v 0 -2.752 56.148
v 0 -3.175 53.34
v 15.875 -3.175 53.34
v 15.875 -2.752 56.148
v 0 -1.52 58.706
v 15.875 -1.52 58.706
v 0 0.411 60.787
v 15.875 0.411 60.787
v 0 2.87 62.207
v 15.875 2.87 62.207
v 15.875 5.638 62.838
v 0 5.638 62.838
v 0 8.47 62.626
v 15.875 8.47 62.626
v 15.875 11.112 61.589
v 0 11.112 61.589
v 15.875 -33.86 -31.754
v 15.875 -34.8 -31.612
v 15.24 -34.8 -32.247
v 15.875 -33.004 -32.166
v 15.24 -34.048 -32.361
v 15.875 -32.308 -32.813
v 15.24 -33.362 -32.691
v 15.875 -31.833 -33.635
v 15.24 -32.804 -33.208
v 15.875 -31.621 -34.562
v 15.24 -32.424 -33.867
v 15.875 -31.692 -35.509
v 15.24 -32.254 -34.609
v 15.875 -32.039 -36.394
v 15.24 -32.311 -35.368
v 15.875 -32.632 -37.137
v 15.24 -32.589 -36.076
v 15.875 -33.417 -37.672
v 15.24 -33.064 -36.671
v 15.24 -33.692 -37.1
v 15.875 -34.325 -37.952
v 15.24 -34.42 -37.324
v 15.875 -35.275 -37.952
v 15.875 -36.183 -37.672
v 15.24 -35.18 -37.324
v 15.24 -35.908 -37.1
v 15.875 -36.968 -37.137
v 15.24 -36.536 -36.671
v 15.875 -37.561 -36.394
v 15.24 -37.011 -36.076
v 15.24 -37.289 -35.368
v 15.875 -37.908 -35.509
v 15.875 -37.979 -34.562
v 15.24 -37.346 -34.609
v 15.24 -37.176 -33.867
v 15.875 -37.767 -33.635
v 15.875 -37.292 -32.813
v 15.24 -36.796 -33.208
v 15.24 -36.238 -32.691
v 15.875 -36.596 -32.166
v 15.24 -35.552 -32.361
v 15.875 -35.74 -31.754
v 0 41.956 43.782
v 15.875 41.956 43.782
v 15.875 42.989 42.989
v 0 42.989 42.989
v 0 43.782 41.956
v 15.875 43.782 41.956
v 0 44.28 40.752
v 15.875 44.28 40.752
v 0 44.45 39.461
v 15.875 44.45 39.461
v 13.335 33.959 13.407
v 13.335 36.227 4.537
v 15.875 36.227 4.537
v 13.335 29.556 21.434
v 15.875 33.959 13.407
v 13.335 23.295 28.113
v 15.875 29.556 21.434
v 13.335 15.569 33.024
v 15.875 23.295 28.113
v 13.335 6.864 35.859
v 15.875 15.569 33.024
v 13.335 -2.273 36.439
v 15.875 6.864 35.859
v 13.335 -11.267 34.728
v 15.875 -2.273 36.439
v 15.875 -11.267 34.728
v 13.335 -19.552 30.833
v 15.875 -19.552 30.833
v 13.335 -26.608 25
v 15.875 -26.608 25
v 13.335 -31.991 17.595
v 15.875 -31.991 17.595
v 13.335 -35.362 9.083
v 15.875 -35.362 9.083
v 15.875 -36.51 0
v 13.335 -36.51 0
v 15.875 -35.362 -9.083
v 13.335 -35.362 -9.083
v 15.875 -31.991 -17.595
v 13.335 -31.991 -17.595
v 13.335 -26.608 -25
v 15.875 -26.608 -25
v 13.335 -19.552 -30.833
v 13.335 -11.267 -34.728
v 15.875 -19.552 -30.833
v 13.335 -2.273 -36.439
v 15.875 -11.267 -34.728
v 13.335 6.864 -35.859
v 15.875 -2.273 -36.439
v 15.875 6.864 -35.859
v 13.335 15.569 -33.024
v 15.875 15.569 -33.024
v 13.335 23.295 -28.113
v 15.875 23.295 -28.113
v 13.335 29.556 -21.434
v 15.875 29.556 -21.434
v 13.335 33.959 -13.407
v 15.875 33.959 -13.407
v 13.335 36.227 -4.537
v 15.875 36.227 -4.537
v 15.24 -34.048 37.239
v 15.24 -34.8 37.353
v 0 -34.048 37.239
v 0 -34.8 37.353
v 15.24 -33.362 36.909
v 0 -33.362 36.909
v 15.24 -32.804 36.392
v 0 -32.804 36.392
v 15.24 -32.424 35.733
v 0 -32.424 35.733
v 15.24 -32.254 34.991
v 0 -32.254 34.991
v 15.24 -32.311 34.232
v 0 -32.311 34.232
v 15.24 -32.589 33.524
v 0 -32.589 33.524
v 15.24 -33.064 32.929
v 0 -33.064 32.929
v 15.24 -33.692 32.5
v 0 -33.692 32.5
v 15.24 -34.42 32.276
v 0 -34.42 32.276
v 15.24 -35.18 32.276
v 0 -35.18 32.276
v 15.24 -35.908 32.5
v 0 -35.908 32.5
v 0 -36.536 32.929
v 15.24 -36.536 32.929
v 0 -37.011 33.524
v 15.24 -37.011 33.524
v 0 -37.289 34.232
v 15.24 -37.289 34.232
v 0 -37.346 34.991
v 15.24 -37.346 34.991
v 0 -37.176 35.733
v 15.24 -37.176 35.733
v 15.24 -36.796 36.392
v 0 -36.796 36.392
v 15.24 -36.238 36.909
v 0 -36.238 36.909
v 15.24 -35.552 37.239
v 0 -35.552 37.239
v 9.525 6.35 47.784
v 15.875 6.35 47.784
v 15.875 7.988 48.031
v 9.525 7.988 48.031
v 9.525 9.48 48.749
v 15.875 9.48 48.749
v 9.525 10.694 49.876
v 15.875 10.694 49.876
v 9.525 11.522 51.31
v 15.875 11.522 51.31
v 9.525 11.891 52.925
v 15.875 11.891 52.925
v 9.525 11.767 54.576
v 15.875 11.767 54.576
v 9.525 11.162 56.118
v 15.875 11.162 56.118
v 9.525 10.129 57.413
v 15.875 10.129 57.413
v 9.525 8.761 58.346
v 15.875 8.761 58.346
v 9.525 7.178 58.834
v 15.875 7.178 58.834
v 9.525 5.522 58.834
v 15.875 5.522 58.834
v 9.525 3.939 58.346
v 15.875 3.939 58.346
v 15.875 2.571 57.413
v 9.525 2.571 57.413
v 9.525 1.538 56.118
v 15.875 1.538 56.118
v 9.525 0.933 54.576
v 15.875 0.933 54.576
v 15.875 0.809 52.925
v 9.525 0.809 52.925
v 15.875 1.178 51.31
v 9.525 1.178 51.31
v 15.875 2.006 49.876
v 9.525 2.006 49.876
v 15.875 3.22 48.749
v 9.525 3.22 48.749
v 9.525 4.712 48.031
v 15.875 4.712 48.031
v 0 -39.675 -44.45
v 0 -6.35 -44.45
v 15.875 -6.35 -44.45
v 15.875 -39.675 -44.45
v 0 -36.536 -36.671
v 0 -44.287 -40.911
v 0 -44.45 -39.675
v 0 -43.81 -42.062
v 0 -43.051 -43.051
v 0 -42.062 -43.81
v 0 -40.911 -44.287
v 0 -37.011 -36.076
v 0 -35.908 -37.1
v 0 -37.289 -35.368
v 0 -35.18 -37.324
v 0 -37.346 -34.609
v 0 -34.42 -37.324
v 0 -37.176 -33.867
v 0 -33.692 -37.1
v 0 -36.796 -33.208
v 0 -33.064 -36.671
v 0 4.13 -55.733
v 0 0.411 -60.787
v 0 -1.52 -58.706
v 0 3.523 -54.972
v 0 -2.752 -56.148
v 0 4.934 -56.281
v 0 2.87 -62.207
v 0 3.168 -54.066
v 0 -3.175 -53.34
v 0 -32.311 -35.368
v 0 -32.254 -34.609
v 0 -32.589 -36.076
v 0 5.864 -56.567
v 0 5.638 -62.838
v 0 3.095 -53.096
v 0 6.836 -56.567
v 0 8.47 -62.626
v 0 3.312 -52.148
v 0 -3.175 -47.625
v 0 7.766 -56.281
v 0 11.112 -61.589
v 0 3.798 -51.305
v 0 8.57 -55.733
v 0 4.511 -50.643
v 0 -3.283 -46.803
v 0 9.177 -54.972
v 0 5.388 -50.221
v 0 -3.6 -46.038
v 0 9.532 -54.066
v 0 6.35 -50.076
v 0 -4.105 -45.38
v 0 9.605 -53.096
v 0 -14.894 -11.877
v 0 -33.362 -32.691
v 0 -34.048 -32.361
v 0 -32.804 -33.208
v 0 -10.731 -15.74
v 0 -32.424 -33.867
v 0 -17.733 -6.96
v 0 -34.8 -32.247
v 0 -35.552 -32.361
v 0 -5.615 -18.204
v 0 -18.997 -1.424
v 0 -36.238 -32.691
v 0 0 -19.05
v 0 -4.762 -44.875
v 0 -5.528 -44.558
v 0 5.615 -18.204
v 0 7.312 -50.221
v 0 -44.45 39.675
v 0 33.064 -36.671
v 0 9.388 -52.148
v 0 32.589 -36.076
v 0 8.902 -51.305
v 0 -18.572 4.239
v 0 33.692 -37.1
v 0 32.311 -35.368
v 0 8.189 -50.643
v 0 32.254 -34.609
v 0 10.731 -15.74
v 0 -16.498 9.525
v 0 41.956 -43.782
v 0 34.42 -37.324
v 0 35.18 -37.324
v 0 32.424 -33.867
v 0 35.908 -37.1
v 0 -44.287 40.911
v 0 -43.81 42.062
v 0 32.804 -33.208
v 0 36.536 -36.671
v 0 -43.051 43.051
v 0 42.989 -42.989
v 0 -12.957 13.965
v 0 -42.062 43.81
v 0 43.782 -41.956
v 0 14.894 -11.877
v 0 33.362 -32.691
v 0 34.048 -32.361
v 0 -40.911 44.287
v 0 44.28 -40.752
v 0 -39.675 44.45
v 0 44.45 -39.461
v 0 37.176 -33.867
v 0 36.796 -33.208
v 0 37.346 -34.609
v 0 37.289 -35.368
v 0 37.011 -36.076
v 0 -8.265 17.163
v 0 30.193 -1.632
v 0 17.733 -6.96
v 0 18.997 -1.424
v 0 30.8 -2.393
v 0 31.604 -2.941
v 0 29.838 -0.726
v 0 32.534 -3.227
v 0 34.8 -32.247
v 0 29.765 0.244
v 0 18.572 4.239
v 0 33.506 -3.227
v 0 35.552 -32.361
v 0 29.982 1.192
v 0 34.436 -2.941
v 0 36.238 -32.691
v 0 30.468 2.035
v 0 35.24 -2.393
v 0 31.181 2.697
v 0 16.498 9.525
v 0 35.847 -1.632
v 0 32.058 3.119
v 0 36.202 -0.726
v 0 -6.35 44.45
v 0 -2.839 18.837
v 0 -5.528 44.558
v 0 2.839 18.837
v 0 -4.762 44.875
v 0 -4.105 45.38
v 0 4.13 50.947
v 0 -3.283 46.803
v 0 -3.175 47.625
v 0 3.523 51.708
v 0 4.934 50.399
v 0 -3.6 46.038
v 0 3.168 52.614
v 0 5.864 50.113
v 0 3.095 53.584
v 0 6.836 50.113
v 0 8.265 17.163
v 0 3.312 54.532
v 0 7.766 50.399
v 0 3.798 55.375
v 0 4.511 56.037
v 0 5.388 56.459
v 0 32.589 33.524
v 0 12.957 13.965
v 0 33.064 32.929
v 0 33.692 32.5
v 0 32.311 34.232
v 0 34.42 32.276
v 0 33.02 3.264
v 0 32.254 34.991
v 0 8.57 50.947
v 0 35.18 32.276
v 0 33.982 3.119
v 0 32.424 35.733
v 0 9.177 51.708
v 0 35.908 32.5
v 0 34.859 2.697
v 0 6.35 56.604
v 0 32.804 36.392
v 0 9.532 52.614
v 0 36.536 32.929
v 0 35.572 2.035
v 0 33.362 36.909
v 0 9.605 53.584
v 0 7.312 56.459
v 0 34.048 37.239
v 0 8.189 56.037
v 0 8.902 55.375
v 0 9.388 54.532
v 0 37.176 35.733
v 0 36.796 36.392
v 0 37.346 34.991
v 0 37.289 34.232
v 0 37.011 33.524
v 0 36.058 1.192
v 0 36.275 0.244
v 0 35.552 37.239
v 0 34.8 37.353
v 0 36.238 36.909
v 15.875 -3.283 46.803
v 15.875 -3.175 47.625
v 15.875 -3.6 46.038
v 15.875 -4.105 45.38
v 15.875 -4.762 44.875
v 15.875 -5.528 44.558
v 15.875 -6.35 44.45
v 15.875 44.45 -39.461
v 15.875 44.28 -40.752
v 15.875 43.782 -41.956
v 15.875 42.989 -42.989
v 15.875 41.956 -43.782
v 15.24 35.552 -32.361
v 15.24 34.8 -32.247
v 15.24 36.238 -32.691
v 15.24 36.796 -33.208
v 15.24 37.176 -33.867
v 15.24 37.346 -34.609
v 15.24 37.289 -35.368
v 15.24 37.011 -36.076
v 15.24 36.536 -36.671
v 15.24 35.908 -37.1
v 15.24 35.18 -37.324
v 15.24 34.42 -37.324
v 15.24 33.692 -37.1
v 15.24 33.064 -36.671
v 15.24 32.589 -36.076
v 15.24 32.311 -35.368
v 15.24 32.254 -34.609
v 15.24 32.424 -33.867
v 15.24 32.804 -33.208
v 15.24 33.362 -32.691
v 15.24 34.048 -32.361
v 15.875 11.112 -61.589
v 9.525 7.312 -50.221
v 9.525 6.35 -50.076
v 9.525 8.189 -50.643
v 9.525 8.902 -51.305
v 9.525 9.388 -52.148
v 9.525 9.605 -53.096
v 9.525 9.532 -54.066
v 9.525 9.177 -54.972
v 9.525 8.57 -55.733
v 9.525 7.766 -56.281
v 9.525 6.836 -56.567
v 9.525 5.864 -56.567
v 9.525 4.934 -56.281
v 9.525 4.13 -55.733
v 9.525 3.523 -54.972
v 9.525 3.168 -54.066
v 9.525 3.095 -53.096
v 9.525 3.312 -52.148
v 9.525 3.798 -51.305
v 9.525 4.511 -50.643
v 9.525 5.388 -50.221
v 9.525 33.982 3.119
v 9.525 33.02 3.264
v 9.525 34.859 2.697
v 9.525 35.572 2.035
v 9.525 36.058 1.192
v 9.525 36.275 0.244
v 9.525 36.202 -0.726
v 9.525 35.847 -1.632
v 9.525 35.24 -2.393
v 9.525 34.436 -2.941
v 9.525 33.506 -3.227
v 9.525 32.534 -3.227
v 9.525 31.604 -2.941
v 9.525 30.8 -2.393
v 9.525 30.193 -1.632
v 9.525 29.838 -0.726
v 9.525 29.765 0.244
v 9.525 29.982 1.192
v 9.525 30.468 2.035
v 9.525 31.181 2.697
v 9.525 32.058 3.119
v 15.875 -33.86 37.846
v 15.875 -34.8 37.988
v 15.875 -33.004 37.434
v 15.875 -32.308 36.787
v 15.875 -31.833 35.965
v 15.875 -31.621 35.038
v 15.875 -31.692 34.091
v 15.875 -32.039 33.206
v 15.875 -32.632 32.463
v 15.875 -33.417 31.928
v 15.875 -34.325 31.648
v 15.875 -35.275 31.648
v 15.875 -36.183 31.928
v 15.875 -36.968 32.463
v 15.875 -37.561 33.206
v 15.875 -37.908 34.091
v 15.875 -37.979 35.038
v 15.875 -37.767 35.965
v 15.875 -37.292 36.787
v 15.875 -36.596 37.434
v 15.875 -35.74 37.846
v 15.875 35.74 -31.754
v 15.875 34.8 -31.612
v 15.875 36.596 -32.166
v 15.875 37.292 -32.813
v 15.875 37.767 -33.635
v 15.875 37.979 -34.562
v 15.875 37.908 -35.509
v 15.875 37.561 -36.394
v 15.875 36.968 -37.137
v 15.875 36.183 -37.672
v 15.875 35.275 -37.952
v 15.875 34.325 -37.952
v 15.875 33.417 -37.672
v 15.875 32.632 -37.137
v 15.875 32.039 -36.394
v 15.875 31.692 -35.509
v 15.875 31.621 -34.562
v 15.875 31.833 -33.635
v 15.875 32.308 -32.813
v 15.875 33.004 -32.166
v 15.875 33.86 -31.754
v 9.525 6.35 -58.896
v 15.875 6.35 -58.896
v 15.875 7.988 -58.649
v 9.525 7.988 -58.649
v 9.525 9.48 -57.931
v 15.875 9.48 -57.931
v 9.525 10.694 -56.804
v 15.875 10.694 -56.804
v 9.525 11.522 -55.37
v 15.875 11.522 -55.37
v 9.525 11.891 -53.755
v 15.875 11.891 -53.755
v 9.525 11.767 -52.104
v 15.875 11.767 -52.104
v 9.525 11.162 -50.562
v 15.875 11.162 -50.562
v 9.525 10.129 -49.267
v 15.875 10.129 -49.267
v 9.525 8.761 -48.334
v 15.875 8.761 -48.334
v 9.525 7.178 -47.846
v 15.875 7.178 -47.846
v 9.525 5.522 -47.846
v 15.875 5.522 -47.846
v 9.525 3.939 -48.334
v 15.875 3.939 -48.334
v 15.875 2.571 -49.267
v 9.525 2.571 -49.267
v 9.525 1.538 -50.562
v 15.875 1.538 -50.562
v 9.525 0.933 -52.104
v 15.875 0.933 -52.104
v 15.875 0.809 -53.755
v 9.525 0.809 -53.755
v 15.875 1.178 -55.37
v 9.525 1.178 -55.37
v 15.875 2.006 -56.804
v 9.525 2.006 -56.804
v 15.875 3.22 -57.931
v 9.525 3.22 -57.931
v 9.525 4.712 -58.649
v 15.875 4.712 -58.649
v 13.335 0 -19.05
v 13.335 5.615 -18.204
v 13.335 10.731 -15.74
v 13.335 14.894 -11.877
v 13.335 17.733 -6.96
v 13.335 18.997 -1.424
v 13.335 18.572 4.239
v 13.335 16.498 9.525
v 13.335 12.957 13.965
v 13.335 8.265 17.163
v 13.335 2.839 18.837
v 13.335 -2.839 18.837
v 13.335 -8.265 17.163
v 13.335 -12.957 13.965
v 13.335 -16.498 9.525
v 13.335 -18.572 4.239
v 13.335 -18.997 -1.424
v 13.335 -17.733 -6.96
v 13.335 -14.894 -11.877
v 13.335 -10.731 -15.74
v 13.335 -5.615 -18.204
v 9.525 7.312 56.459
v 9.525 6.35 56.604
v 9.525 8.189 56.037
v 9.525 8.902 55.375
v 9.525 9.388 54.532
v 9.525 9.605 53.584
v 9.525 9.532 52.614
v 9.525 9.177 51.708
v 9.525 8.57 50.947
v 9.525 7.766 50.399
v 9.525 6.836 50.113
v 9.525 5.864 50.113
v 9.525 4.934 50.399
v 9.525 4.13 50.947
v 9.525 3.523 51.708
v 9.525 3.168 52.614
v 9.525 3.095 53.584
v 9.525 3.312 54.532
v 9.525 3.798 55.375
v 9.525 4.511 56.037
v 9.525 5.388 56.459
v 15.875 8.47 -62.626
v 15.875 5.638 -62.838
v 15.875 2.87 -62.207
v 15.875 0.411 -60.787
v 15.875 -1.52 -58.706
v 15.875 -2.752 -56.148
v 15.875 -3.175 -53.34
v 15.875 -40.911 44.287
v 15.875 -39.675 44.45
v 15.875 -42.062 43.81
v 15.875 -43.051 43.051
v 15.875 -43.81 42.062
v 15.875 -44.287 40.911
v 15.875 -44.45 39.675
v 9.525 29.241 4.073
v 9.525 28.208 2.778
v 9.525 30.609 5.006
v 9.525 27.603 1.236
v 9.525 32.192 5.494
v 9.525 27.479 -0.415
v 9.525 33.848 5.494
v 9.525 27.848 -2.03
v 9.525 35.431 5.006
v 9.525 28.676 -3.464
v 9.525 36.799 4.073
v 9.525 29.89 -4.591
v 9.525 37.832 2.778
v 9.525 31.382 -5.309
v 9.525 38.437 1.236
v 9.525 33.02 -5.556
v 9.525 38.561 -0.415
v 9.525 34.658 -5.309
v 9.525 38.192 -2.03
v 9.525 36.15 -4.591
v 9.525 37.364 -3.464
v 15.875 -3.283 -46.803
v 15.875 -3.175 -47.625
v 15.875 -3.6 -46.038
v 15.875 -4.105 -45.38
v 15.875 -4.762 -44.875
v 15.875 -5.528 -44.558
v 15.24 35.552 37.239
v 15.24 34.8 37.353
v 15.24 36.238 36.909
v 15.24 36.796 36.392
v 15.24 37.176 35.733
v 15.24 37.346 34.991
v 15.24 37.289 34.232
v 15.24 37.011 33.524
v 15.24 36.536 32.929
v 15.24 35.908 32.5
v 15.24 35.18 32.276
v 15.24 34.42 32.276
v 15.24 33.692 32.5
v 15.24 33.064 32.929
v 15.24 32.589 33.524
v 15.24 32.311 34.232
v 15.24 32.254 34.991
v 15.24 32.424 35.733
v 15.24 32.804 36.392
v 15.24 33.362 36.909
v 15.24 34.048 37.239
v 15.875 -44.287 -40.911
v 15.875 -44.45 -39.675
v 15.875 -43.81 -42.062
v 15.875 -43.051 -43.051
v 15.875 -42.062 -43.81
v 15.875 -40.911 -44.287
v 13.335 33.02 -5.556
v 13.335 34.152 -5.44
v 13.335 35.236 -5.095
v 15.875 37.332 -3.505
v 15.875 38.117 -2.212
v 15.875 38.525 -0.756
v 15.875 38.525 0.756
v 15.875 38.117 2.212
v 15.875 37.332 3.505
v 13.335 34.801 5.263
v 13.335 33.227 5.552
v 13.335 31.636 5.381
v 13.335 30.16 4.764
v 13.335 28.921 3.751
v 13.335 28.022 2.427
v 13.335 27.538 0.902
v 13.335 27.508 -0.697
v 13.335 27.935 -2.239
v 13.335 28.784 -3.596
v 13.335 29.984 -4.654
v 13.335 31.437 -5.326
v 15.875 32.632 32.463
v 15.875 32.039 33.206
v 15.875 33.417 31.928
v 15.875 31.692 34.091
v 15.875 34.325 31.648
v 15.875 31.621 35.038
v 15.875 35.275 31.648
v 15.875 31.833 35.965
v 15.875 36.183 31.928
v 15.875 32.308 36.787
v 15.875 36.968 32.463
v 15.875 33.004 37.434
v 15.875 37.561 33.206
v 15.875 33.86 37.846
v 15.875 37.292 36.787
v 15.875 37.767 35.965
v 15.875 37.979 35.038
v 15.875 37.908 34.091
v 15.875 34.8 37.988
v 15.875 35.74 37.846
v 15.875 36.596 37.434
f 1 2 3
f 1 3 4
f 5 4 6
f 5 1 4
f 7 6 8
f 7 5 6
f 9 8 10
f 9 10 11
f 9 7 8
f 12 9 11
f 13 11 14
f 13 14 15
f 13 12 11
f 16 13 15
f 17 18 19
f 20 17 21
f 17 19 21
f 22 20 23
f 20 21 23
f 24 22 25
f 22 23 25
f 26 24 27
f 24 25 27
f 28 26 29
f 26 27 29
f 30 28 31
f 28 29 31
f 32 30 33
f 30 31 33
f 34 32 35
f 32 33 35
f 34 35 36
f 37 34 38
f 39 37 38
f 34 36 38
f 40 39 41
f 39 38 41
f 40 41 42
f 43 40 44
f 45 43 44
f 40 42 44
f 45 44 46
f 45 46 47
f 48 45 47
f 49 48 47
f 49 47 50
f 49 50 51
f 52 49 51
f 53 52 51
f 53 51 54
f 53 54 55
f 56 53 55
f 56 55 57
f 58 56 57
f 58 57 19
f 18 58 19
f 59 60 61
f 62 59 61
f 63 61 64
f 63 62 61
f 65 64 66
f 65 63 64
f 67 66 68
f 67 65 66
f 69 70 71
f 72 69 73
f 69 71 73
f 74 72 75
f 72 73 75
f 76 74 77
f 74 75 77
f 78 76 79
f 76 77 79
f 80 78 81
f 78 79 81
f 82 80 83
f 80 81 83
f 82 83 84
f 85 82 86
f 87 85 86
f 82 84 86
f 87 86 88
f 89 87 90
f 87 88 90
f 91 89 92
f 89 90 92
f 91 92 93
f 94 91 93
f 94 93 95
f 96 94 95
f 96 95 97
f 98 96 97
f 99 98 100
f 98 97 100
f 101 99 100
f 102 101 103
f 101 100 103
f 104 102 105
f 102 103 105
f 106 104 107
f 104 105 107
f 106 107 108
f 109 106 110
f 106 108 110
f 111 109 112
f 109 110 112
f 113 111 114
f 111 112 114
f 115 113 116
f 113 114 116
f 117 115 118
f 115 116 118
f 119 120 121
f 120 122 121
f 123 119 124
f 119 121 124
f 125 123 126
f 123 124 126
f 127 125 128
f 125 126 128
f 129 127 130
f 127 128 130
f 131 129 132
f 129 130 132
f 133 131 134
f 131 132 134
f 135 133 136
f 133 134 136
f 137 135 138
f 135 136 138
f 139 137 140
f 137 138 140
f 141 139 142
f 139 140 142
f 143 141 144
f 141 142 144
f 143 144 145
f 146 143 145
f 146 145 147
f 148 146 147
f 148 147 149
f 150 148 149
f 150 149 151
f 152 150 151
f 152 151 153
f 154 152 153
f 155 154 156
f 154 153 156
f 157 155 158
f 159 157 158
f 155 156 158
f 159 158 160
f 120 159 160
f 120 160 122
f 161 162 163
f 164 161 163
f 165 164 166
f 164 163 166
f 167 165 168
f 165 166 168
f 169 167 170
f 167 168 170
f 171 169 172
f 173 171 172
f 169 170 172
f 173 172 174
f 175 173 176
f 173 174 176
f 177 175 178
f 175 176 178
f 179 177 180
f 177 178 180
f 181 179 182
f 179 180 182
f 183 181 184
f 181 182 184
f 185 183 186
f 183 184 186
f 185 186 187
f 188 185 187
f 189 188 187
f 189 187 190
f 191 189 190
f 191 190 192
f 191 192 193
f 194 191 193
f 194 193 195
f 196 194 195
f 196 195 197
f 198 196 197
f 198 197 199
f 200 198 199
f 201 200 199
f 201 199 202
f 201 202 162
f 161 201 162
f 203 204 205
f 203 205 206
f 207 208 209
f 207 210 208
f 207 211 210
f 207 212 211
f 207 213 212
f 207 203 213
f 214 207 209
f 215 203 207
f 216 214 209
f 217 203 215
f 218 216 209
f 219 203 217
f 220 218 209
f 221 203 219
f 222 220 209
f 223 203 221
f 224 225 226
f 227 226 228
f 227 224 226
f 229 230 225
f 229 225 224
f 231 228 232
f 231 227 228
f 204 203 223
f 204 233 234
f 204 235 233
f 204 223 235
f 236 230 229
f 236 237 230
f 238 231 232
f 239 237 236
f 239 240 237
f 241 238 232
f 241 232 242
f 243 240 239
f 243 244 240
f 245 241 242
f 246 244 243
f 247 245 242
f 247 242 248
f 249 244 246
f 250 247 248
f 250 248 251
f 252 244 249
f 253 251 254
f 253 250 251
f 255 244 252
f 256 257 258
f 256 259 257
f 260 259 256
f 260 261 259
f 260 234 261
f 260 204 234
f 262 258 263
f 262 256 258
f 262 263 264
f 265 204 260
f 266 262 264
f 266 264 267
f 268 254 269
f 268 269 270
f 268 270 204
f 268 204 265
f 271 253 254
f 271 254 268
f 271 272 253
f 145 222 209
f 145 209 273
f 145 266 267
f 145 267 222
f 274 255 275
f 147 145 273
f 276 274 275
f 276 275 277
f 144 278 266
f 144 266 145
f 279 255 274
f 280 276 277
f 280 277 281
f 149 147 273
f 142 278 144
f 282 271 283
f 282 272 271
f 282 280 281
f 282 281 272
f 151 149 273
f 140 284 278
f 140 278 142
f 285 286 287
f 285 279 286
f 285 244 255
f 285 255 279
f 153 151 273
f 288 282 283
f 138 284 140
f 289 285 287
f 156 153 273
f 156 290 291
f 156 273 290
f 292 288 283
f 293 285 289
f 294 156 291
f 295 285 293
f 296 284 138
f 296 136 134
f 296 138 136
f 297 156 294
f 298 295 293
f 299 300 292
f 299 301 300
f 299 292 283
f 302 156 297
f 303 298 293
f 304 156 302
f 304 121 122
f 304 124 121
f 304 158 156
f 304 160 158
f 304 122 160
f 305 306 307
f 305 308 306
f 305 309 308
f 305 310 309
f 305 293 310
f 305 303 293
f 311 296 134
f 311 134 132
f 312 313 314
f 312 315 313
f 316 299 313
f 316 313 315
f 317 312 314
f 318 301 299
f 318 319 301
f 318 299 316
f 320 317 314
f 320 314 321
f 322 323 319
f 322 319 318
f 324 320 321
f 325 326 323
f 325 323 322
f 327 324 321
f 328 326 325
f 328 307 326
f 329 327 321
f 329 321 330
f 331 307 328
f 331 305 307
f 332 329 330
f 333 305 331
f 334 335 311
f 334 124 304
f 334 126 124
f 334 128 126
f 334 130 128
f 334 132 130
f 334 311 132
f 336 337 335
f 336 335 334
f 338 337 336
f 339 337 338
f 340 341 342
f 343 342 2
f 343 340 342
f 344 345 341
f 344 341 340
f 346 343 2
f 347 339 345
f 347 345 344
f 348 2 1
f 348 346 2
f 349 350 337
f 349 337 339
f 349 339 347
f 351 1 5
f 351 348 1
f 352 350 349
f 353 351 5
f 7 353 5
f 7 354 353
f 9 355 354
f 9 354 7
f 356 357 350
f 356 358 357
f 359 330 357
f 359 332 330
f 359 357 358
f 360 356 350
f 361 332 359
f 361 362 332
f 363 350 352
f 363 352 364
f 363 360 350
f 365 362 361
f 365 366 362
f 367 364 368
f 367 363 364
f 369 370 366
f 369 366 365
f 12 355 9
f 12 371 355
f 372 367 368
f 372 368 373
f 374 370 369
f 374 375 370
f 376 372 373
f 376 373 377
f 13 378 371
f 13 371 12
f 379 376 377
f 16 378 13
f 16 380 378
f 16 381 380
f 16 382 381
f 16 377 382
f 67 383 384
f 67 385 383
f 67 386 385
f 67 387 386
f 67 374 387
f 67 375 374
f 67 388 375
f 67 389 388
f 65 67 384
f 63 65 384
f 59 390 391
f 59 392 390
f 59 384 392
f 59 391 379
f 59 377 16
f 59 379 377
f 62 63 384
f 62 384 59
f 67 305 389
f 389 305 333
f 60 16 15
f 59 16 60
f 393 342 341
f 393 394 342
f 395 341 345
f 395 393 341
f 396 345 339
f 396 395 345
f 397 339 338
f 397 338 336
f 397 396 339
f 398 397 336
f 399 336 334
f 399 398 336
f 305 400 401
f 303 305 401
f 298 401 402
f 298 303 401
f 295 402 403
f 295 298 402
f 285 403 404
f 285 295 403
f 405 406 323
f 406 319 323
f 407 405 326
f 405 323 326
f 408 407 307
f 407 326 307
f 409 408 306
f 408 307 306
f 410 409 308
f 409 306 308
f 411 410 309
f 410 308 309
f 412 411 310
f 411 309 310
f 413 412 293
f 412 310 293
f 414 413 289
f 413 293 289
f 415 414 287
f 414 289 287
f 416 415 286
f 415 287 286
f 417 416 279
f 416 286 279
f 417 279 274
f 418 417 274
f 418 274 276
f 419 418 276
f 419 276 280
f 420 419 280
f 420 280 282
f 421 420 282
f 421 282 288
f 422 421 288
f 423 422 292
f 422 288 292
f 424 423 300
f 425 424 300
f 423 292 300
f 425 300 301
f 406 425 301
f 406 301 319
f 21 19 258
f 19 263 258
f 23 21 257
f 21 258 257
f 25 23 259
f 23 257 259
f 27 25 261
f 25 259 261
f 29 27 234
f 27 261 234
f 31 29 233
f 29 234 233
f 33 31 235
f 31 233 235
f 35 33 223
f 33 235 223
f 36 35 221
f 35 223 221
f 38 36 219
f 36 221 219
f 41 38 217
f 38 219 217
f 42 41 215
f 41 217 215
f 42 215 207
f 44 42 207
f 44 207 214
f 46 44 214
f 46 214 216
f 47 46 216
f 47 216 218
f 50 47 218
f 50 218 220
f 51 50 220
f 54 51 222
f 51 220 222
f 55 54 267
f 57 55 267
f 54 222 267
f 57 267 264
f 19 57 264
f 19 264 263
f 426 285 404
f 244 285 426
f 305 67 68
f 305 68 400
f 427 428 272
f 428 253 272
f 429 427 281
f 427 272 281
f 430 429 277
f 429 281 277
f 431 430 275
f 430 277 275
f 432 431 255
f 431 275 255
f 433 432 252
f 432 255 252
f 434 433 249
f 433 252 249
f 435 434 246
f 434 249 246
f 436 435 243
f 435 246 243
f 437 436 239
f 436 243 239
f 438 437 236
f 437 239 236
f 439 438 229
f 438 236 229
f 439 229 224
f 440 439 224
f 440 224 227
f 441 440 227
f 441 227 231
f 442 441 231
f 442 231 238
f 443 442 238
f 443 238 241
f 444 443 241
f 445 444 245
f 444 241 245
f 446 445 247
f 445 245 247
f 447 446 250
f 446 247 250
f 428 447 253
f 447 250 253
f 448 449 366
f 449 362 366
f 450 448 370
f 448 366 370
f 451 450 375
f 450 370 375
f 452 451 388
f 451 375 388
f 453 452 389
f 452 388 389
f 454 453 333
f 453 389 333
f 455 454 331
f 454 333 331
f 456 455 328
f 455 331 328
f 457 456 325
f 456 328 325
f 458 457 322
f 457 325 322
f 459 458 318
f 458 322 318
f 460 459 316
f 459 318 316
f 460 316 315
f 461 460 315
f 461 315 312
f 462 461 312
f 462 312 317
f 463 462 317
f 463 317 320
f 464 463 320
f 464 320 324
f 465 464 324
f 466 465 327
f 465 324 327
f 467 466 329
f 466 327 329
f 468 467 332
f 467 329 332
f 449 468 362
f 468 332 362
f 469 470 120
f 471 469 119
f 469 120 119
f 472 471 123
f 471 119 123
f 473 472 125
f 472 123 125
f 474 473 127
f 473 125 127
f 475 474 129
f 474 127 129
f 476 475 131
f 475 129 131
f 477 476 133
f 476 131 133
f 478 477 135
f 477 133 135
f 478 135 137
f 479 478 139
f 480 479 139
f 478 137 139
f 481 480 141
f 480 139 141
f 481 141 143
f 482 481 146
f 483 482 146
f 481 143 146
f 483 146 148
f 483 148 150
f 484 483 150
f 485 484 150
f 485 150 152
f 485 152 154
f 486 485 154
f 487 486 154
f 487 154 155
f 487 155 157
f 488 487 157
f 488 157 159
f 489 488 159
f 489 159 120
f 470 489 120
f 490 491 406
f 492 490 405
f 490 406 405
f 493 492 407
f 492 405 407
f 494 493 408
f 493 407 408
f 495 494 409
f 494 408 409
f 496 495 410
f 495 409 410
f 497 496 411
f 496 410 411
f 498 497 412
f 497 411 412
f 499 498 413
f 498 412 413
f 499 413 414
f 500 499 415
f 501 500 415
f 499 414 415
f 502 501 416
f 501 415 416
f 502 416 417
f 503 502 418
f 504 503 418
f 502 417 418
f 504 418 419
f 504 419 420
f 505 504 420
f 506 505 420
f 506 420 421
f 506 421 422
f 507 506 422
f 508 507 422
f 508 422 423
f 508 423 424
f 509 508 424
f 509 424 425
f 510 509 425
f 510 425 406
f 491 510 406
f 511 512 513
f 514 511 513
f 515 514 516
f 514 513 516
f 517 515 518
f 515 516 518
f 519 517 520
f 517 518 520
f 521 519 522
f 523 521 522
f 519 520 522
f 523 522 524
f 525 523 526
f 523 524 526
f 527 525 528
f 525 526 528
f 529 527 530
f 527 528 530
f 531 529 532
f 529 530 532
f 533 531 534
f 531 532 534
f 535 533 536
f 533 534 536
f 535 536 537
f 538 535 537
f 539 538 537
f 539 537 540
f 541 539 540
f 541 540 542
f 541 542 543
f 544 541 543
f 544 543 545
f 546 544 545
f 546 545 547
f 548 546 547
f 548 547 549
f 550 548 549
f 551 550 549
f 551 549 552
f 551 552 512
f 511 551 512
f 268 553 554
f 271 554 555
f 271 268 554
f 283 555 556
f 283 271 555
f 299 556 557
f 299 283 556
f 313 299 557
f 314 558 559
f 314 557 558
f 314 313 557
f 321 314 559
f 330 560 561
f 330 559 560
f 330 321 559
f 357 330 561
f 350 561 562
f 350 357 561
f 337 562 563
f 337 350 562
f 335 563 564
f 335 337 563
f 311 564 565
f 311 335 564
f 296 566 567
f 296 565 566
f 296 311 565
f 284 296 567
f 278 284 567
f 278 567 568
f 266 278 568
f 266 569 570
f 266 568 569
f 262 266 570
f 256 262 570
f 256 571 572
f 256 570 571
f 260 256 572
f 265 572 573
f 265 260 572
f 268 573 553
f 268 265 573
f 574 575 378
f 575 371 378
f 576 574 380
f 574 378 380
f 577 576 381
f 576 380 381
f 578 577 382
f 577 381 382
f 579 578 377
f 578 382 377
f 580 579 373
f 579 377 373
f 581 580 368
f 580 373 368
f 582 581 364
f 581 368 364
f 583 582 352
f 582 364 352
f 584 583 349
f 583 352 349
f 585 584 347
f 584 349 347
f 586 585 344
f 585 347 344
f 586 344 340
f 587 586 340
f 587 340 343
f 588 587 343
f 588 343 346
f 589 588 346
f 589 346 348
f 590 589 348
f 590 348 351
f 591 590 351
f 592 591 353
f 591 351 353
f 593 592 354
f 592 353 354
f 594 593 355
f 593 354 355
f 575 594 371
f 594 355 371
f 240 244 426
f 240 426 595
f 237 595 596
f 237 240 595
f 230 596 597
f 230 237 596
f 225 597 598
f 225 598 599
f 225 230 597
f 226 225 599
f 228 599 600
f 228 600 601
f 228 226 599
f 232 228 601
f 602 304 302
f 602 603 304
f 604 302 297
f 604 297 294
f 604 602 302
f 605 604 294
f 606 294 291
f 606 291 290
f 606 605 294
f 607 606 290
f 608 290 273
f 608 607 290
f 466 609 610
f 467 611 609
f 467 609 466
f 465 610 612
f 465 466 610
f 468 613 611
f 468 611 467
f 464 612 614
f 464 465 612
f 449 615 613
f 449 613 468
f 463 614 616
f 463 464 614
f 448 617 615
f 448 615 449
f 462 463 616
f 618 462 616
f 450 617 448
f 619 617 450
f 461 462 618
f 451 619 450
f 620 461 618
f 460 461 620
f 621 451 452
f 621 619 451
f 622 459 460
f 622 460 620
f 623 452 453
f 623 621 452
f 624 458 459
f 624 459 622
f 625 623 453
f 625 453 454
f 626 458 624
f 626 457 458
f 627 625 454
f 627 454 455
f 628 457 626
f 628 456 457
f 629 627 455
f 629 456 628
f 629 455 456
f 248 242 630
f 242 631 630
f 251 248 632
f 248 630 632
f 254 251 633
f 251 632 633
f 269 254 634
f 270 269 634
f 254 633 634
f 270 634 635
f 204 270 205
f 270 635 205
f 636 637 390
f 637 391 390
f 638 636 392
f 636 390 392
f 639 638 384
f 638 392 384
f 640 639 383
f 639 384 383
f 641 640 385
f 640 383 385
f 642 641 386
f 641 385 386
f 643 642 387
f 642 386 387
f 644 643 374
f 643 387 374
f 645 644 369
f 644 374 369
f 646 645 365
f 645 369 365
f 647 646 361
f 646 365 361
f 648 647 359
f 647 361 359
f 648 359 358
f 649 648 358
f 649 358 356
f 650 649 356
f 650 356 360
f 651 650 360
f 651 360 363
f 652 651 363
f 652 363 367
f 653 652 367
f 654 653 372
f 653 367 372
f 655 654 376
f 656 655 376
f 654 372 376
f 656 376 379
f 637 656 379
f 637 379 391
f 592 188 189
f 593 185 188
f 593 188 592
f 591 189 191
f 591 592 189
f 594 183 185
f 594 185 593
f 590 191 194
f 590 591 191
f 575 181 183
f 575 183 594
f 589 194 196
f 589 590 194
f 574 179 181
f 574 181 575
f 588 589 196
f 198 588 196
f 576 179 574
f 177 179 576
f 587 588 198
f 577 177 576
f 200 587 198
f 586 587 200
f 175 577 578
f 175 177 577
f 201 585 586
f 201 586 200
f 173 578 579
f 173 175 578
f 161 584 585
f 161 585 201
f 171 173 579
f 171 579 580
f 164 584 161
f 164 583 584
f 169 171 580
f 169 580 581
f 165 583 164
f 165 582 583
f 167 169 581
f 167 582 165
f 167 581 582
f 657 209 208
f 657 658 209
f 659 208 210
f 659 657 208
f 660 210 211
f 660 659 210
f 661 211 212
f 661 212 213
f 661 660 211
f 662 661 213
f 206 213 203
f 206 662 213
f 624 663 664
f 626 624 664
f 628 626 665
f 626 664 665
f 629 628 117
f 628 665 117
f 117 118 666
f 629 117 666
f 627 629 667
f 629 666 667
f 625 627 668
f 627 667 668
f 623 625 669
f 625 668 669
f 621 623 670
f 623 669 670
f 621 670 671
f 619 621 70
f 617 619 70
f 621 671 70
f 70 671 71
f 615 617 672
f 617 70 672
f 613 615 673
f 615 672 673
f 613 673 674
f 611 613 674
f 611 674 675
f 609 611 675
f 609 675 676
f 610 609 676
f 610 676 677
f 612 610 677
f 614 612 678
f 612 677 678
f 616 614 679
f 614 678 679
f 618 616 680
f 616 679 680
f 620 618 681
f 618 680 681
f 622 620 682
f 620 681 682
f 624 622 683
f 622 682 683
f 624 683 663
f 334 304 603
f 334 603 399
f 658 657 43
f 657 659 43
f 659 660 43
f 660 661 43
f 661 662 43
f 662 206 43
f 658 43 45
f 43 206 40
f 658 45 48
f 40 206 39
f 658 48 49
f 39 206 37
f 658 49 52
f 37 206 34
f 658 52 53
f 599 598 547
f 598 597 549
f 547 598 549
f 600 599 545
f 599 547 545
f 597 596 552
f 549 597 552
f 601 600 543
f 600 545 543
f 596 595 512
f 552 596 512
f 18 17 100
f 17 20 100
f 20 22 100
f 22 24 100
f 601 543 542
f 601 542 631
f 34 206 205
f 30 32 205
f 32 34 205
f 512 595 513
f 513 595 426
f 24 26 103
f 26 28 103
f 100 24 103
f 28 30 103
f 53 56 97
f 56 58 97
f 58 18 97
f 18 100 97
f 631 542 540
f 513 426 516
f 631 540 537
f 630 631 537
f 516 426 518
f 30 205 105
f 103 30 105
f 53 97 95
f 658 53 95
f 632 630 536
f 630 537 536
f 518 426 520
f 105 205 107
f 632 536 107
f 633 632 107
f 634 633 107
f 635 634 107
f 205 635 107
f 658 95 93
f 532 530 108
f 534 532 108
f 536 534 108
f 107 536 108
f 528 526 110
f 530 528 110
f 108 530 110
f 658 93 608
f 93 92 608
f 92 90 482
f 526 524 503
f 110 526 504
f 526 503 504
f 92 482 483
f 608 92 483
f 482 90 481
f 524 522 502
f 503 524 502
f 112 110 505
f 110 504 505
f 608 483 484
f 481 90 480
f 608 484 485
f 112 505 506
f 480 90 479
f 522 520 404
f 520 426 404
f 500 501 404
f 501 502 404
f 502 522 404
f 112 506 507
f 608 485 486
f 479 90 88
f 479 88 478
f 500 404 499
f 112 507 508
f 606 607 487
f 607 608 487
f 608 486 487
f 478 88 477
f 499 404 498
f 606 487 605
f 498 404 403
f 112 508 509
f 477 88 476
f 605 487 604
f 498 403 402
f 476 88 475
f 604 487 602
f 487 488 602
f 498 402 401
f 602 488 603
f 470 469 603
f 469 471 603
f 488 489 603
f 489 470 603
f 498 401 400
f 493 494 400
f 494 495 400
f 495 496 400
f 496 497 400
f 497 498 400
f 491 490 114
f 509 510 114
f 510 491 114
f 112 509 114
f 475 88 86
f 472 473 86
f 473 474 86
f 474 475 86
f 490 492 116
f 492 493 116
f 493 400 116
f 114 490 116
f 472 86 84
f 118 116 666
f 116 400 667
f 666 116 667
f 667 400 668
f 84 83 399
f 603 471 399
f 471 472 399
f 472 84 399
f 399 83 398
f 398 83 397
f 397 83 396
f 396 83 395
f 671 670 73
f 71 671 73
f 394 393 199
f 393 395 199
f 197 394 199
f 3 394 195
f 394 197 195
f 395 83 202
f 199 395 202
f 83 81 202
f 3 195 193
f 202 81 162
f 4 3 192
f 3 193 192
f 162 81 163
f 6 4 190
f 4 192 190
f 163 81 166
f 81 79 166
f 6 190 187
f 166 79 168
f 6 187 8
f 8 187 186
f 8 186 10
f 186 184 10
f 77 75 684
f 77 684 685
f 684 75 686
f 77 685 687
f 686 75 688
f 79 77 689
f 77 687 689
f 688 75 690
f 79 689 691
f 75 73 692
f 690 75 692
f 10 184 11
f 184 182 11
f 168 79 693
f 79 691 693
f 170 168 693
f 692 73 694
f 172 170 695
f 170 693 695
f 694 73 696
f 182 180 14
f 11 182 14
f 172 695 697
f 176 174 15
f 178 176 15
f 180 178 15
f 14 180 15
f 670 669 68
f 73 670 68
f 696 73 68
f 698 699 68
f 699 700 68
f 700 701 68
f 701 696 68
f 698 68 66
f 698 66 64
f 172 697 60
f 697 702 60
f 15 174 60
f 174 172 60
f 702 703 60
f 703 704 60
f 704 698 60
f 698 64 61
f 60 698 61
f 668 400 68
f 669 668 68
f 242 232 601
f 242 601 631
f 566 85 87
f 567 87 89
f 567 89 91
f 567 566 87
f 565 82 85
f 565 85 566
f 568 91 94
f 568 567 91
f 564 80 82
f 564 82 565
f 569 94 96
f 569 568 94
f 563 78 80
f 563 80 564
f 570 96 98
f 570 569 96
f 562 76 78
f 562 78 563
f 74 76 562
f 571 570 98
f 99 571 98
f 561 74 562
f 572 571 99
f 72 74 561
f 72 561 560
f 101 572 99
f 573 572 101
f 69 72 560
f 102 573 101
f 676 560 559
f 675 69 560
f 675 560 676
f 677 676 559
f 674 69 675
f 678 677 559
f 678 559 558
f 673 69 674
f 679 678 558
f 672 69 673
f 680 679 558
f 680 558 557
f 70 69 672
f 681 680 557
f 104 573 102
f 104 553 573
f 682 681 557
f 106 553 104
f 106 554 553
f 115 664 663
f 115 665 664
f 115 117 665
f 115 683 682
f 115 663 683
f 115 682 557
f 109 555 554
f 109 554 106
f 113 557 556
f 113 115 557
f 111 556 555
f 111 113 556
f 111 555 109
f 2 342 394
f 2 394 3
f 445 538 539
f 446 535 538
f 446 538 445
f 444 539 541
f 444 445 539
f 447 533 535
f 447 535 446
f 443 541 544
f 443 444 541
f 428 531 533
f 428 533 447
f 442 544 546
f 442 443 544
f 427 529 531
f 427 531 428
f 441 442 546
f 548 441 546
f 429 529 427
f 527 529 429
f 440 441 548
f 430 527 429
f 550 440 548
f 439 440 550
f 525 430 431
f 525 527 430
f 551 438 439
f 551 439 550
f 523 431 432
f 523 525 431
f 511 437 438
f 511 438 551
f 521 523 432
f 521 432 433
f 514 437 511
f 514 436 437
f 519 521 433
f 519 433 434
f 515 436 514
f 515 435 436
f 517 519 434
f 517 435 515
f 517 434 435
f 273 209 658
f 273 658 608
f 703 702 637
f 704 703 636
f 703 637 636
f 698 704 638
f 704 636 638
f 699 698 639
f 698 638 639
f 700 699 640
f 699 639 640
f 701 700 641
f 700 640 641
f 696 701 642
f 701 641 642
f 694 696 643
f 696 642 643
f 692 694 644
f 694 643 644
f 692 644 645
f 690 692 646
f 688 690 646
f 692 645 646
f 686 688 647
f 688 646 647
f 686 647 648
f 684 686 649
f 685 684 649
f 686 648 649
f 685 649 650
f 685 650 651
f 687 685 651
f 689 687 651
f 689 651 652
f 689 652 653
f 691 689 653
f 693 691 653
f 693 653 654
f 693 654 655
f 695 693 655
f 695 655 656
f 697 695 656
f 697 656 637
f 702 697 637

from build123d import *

# Parameters (mm, degrees)
SKETCH1_R                                        = 19.05
BOSS_EXTRUDE1_DEPTH                              = 15.875
FILLET2_R                                        = 3.175
FILLET3_R                                        = 4.7752
SKETCH6_R                                        = 36.5099981
CUT_EXTRUDE2_DEPTH                               = 2.54
CBORE_FOR_1_4_SOCKET_HEAD_CAP_SCREW1_D           = 6.5278
CBORE_FOR_1_4_SOCKET_HEAD_CAP_SCREW1_CBORE_D     = 11.1125
CBORE_FOR_1_4_SOCKET_HEAD_CAP_SCREW1_CBORE_DEPTH = 6.35
F_1_4_20_TAPPED_HOLE1_D                          = 5.1054
F_1_4_20_TAPPED_HOLE1_DEPTH                      = 19.05
F_1_4_20_TAPPED_HOLE1_CSINK_D                    = 6.3754
F_1_4_20_TAPPED_HOLE1_CSINK_ANGLE                = 90
F_1_4_20_TAPPED_HOLE1_TIP                        = 1.533816902


with BuildPart() as part:
    # Sketch1 → Boss-Extrude1 (new body)
    with BuildSketch(Plane(origin=(0, 0, 0), x_dir=(0, 0, -1), z_dir=(1, 0, 0))):
        with BuildLine():
            Line((-39.461181898, 44.45), (39.461181898, 44.45))
            ThreePointArc((39.461181898, 44.45), (41.955590949, 43.781625109), (43.781625109, 41.955590949))
            Line((43.781625109, 41.955590949), (61.588891971, 11.1125))
            ThreePointArc((61.588891971, 11.1125), (61.588891971, 1.5875), (53.34, -3.175))
            Line((53.34, -3.175), (44.45, -3.175))
            Line((44.45, -3.175), (44.45, -44.45))
            Line((44.45, -44.45), (-44.45, -44.45))
            Line((-44.45, -44.45), (-44.45, -3.175))
            Line((-44.45, -3.175), (-53.34, -3.175))
            ThreePointArc((-53.34, -3.175), (-61.588891971, 1.5875), (-61.588891971, 11.1125))
            Line((-61.588891971, 11.1125), (-43.781625109, 41.955590949))
            ThreePointArc((-43.781625109, 41.955590949), (-41.955590949, 43.781625109), (-39.461181898, 44.45))
        make_face()
        Circle(SKETCH1_R, mode=Mode.SUBTRACT)
    extrude(amount=BOSS_EXTRUDE1_DEPTH)

    # Fillet2
    fillet2_edges = [part.edges().sort_by_distance(p)[0] for p in [
        (7.9375, -3.175, 44.45),
        (7.9375, -3.175, -44.45),
    ]]
    fillet(fillet2_edges, radius=FILLET2_R)

    # Fillet3
    fillet3_edges = [part.edges().sort_by_distance(p)[0] for p in [
        (7.9375, -44.45, 44.45),
        (7.9375, -44.45, -44.45),
    ]]
    fillet(fillet3_edges, radius=FILLET3_R)

    # Sketch6 → Cut-Extrude2 (cut)
    with BuildSketch(Plane(origin=(15.875, 0, 0), x_dir=(0, 0, -1), z_dir=(1, 0, 0))):
        Circle(SKETCH6_R)
    extrude(amount=-CUT_EXTRUDE2_DEPTH, mode=Mode.SUBTRACT)

    # CBORE for 1/4 Socket Head Cap Screw1 (through all)
    with Locations(Plane(origin=(15.875, 0, 0), x_dir=(0, 0, -1), z_dir=(1, 0, 0))):
        with Locations((-53.34, 6.35), (53.34, 6.35), (0, 33.02)):
            CounterBoreHole(CBORE_FOR_1_4_SOCKET_HEAD_CAP_SCREW1_D / 2, CBORE_FOR_1_4_SOCKET_HEAD_CAP_SCREW1_CBORE_D / 2, CBORE_FOR_1_4_SOCKET_HEAD_CAP_SCREW1_CBORE_DEPTH)

    # 1/4-20 Tapped Hole1
    with Locations(Plane(origin=(15.875, 0, 0), x_dir=(0, 0, -1), z_dir=(1, 0, 0))):
        with Locations((34.8, -34.8), (-34.8, 34.8), (-34.8, -34.8), (34.8, 34.8)):
            CounterSinkHole(F_1_4_20_TAPPED_HOLE1_D / 2, F_1_4_20_TAPPED_HOLE1_CSINK_D / 2, depth=F_1_4_20_TAPPED_HOLE1_DEPTH, counter_sink_angle=F_1_4_20_TAPPED_HOLE1_CSINK_ANGLE)
            with Locations((0, 0, -(F_1_4_20_TAPPED_HOLE1_DEPTH + F_1_4_20_TAPPED_HOLE1_TIP / 2))):  # 118° drill point
                Cone(0, F_1_4_20_TAPPED_HOLE1_D / 2, F_1_4_20_TAPPED_HOLE1_TIP, mode=Mode.SUBTRACT)


solid = part.part
